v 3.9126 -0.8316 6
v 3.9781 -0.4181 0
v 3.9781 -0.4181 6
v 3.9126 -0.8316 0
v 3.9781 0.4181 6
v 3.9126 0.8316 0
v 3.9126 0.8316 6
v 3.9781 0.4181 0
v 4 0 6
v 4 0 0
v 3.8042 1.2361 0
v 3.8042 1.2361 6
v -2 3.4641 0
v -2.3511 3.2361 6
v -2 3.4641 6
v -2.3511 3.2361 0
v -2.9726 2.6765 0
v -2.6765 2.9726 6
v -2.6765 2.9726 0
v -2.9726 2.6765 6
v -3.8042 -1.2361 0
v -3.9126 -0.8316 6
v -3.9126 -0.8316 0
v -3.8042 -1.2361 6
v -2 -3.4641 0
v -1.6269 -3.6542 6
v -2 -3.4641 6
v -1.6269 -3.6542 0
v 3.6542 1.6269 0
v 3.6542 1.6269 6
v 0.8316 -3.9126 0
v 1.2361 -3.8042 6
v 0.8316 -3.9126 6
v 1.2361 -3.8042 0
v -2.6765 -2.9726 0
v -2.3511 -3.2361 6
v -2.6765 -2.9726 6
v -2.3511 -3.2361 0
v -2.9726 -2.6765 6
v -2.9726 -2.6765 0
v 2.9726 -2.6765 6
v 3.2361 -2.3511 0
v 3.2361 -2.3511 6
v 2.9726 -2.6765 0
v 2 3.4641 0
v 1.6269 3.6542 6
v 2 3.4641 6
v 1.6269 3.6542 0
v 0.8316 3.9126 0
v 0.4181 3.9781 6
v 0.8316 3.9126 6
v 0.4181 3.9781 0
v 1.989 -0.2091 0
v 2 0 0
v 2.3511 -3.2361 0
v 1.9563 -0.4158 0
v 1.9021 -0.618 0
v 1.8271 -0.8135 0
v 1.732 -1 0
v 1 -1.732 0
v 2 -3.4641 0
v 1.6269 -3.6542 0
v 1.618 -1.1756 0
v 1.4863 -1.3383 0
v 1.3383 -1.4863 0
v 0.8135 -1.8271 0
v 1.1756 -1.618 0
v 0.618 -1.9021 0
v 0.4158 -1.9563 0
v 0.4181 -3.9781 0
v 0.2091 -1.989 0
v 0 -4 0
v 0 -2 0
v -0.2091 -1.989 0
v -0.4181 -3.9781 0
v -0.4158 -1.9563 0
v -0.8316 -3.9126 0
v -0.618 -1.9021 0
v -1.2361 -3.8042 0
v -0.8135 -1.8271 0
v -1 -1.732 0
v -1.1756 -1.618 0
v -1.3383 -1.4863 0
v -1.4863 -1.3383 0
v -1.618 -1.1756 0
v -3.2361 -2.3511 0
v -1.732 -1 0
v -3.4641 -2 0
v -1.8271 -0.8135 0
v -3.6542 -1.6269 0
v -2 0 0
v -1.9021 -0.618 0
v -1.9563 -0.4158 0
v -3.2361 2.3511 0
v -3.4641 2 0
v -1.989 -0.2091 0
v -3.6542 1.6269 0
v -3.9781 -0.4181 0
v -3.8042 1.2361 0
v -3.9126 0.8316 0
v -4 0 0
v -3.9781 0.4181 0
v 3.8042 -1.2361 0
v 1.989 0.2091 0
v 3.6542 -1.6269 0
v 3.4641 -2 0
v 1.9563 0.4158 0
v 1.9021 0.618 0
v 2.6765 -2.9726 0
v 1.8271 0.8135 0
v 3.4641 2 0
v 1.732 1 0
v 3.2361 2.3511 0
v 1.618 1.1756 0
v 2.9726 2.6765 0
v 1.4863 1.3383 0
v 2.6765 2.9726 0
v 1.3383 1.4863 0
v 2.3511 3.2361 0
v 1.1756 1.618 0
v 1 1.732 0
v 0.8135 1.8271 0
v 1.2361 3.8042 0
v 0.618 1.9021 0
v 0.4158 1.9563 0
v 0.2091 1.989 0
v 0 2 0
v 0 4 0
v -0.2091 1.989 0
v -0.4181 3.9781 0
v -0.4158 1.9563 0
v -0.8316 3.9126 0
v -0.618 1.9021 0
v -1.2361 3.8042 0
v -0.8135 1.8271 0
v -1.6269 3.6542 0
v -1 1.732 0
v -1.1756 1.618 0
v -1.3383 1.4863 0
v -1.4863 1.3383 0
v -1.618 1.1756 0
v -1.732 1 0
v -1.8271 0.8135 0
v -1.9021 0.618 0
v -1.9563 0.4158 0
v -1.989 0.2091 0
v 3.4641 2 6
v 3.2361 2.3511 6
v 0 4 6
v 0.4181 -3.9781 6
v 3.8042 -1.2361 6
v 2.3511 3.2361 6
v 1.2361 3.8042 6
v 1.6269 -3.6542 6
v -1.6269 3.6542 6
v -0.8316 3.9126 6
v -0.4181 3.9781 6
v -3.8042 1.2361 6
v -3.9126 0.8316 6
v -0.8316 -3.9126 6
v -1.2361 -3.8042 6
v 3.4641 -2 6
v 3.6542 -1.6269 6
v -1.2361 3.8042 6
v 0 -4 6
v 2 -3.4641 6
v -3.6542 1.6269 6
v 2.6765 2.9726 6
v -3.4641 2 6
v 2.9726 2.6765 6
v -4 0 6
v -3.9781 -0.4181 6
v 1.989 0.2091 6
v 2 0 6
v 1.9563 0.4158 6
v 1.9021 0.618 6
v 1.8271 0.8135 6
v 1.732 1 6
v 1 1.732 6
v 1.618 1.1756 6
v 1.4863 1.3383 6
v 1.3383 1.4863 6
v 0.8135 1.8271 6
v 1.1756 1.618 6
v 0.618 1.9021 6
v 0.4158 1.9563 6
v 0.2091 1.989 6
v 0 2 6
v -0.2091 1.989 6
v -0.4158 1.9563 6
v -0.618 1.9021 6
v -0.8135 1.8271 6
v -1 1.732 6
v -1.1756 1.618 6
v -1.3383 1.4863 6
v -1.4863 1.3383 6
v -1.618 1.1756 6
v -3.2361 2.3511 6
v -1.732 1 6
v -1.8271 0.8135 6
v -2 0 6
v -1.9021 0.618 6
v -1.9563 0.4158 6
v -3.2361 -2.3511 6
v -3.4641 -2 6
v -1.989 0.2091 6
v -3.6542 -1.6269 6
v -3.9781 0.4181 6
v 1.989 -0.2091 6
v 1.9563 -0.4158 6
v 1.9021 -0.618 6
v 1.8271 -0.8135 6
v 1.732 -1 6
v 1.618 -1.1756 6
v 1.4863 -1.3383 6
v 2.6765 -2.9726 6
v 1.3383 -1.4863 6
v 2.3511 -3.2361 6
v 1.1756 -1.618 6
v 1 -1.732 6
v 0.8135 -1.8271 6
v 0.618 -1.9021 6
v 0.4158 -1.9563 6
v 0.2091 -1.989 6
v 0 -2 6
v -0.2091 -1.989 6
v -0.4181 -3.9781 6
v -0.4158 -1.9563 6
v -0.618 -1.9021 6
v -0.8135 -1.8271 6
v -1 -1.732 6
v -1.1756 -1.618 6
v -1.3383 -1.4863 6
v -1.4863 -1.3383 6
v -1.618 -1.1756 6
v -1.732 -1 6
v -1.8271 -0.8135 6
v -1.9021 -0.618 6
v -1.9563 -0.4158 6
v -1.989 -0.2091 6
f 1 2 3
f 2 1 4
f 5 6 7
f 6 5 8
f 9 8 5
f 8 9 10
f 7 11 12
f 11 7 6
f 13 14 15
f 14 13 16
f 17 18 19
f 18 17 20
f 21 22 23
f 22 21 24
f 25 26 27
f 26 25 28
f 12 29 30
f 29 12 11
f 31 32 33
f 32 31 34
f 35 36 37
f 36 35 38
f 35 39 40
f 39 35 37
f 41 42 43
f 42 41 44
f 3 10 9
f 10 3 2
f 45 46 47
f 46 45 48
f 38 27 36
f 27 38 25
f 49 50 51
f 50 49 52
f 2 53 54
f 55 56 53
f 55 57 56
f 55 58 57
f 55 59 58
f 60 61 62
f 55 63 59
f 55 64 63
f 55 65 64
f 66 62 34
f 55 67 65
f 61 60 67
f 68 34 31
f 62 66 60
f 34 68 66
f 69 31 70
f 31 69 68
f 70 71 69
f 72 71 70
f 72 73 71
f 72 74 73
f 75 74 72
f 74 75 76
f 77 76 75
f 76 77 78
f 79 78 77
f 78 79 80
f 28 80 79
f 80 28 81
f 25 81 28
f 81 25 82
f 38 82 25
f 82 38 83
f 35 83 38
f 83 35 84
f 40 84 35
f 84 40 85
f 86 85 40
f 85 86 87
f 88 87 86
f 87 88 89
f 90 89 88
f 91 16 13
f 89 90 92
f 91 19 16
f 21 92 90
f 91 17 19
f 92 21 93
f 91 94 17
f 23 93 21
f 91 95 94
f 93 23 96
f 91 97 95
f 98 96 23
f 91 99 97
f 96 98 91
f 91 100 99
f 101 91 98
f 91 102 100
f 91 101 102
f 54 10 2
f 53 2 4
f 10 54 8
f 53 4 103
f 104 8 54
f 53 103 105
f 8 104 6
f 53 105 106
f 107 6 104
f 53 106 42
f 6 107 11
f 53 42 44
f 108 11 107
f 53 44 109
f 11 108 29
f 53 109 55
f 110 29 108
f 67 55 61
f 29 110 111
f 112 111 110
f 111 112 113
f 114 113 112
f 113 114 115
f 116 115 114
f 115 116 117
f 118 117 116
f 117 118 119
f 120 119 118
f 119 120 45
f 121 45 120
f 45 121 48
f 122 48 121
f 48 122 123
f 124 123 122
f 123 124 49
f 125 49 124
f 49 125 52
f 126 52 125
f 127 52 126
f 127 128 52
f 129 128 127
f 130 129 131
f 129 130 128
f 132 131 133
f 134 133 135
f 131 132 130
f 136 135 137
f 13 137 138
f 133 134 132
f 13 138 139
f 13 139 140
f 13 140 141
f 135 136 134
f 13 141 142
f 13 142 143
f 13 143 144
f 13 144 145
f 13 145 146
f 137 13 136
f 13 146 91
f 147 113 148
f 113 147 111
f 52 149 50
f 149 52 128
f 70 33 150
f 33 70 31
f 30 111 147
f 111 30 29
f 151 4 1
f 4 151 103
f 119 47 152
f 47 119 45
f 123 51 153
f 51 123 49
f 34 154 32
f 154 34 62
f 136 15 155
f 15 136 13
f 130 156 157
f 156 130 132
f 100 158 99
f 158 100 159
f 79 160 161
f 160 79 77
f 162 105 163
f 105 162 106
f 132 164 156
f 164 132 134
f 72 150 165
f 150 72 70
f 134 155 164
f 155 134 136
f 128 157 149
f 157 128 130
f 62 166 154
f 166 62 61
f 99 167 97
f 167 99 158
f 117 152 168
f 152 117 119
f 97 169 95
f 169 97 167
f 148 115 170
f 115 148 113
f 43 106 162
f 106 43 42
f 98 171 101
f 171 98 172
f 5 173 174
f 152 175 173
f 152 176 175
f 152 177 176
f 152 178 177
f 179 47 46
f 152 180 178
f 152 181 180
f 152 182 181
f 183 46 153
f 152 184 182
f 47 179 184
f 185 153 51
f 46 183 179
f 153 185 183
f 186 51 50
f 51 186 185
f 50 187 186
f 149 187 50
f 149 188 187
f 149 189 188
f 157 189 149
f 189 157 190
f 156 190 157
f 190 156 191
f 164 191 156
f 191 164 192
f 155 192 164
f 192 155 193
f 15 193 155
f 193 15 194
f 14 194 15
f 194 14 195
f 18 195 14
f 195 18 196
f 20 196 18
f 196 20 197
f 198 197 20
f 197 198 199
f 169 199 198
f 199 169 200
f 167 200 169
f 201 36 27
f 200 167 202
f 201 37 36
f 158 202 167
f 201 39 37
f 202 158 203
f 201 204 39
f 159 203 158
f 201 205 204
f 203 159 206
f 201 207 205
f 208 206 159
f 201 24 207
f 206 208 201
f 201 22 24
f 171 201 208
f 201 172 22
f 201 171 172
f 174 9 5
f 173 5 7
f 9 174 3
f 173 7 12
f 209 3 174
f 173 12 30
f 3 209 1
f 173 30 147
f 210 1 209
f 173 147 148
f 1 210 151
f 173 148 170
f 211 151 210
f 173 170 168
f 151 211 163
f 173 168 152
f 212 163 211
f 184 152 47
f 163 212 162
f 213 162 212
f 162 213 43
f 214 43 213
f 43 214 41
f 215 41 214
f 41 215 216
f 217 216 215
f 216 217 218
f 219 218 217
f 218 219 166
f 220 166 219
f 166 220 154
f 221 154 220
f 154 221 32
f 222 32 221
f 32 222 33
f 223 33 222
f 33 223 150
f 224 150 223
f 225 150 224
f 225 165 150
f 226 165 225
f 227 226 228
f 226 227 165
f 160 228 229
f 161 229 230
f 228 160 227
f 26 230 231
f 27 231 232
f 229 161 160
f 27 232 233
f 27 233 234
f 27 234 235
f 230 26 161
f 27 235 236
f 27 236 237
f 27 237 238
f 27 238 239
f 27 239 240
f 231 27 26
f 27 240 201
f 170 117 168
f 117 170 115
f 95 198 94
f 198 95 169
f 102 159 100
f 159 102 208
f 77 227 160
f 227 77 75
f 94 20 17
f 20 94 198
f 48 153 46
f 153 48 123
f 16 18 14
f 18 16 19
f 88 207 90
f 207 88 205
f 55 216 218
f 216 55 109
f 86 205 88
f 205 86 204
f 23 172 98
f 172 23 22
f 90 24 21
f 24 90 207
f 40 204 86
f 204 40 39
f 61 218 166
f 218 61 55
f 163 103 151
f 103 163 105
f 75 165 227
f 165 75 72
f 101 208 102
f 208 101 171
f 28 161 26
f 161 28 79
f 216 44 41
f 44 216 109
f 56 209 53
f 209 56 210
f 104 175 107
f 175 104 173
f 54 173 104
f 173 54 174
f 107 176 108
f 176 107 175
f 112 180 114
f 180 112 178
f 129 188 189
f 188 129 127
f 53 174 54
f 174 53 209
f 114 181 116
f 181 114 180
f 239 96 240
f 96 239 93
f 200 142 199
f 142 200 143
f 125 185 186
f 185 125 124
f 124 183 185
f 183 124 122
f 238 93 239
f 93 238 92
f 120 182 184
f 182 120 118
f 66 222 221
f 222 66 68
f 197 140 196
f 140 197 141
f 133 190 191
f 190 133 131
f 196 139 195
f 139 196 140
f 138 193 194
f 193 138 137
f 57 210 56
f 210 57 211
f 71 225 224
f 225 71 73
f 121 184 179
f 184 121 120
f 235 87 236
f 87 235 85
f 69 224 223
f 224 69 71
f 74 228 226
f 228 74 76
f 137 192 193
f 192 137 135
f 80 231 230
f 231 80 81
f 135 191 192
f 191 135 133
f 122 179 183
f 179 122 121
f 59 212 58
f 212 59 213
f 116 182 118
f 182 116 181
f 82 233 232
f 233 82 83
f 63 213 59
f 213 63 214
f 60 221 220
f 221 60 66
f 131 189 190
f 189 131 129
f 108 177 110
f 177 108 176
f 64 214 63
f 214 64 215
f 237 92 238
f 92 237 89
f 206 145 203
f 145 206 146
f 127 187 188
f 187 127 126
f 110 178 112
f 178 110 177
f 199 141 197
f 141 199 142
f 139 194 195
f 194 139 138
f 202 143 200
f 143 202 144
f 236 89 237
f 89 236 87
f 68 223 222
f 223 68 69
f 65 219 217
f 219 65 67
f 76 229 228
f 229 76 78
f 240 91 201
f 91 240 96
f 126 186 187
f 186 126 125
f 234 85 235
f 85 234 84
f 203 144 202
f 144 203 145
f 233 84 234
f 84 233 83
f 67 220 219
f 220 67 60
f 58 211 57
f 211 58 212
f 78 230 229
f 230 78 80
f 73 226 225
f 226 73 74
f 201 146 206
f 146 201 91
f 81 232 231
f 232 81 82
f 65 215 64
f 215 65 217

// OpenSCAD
// Axle spacer tube.
$fn = 60;
eps = 0.02;
inner_d = 4;
outer_d = 8;
length = 6;
difference() { cylinder(d = outer_d, h = length); translate([0,0,-eps]) cylinder(d = inner_d, h = length + 2 * eps); }
